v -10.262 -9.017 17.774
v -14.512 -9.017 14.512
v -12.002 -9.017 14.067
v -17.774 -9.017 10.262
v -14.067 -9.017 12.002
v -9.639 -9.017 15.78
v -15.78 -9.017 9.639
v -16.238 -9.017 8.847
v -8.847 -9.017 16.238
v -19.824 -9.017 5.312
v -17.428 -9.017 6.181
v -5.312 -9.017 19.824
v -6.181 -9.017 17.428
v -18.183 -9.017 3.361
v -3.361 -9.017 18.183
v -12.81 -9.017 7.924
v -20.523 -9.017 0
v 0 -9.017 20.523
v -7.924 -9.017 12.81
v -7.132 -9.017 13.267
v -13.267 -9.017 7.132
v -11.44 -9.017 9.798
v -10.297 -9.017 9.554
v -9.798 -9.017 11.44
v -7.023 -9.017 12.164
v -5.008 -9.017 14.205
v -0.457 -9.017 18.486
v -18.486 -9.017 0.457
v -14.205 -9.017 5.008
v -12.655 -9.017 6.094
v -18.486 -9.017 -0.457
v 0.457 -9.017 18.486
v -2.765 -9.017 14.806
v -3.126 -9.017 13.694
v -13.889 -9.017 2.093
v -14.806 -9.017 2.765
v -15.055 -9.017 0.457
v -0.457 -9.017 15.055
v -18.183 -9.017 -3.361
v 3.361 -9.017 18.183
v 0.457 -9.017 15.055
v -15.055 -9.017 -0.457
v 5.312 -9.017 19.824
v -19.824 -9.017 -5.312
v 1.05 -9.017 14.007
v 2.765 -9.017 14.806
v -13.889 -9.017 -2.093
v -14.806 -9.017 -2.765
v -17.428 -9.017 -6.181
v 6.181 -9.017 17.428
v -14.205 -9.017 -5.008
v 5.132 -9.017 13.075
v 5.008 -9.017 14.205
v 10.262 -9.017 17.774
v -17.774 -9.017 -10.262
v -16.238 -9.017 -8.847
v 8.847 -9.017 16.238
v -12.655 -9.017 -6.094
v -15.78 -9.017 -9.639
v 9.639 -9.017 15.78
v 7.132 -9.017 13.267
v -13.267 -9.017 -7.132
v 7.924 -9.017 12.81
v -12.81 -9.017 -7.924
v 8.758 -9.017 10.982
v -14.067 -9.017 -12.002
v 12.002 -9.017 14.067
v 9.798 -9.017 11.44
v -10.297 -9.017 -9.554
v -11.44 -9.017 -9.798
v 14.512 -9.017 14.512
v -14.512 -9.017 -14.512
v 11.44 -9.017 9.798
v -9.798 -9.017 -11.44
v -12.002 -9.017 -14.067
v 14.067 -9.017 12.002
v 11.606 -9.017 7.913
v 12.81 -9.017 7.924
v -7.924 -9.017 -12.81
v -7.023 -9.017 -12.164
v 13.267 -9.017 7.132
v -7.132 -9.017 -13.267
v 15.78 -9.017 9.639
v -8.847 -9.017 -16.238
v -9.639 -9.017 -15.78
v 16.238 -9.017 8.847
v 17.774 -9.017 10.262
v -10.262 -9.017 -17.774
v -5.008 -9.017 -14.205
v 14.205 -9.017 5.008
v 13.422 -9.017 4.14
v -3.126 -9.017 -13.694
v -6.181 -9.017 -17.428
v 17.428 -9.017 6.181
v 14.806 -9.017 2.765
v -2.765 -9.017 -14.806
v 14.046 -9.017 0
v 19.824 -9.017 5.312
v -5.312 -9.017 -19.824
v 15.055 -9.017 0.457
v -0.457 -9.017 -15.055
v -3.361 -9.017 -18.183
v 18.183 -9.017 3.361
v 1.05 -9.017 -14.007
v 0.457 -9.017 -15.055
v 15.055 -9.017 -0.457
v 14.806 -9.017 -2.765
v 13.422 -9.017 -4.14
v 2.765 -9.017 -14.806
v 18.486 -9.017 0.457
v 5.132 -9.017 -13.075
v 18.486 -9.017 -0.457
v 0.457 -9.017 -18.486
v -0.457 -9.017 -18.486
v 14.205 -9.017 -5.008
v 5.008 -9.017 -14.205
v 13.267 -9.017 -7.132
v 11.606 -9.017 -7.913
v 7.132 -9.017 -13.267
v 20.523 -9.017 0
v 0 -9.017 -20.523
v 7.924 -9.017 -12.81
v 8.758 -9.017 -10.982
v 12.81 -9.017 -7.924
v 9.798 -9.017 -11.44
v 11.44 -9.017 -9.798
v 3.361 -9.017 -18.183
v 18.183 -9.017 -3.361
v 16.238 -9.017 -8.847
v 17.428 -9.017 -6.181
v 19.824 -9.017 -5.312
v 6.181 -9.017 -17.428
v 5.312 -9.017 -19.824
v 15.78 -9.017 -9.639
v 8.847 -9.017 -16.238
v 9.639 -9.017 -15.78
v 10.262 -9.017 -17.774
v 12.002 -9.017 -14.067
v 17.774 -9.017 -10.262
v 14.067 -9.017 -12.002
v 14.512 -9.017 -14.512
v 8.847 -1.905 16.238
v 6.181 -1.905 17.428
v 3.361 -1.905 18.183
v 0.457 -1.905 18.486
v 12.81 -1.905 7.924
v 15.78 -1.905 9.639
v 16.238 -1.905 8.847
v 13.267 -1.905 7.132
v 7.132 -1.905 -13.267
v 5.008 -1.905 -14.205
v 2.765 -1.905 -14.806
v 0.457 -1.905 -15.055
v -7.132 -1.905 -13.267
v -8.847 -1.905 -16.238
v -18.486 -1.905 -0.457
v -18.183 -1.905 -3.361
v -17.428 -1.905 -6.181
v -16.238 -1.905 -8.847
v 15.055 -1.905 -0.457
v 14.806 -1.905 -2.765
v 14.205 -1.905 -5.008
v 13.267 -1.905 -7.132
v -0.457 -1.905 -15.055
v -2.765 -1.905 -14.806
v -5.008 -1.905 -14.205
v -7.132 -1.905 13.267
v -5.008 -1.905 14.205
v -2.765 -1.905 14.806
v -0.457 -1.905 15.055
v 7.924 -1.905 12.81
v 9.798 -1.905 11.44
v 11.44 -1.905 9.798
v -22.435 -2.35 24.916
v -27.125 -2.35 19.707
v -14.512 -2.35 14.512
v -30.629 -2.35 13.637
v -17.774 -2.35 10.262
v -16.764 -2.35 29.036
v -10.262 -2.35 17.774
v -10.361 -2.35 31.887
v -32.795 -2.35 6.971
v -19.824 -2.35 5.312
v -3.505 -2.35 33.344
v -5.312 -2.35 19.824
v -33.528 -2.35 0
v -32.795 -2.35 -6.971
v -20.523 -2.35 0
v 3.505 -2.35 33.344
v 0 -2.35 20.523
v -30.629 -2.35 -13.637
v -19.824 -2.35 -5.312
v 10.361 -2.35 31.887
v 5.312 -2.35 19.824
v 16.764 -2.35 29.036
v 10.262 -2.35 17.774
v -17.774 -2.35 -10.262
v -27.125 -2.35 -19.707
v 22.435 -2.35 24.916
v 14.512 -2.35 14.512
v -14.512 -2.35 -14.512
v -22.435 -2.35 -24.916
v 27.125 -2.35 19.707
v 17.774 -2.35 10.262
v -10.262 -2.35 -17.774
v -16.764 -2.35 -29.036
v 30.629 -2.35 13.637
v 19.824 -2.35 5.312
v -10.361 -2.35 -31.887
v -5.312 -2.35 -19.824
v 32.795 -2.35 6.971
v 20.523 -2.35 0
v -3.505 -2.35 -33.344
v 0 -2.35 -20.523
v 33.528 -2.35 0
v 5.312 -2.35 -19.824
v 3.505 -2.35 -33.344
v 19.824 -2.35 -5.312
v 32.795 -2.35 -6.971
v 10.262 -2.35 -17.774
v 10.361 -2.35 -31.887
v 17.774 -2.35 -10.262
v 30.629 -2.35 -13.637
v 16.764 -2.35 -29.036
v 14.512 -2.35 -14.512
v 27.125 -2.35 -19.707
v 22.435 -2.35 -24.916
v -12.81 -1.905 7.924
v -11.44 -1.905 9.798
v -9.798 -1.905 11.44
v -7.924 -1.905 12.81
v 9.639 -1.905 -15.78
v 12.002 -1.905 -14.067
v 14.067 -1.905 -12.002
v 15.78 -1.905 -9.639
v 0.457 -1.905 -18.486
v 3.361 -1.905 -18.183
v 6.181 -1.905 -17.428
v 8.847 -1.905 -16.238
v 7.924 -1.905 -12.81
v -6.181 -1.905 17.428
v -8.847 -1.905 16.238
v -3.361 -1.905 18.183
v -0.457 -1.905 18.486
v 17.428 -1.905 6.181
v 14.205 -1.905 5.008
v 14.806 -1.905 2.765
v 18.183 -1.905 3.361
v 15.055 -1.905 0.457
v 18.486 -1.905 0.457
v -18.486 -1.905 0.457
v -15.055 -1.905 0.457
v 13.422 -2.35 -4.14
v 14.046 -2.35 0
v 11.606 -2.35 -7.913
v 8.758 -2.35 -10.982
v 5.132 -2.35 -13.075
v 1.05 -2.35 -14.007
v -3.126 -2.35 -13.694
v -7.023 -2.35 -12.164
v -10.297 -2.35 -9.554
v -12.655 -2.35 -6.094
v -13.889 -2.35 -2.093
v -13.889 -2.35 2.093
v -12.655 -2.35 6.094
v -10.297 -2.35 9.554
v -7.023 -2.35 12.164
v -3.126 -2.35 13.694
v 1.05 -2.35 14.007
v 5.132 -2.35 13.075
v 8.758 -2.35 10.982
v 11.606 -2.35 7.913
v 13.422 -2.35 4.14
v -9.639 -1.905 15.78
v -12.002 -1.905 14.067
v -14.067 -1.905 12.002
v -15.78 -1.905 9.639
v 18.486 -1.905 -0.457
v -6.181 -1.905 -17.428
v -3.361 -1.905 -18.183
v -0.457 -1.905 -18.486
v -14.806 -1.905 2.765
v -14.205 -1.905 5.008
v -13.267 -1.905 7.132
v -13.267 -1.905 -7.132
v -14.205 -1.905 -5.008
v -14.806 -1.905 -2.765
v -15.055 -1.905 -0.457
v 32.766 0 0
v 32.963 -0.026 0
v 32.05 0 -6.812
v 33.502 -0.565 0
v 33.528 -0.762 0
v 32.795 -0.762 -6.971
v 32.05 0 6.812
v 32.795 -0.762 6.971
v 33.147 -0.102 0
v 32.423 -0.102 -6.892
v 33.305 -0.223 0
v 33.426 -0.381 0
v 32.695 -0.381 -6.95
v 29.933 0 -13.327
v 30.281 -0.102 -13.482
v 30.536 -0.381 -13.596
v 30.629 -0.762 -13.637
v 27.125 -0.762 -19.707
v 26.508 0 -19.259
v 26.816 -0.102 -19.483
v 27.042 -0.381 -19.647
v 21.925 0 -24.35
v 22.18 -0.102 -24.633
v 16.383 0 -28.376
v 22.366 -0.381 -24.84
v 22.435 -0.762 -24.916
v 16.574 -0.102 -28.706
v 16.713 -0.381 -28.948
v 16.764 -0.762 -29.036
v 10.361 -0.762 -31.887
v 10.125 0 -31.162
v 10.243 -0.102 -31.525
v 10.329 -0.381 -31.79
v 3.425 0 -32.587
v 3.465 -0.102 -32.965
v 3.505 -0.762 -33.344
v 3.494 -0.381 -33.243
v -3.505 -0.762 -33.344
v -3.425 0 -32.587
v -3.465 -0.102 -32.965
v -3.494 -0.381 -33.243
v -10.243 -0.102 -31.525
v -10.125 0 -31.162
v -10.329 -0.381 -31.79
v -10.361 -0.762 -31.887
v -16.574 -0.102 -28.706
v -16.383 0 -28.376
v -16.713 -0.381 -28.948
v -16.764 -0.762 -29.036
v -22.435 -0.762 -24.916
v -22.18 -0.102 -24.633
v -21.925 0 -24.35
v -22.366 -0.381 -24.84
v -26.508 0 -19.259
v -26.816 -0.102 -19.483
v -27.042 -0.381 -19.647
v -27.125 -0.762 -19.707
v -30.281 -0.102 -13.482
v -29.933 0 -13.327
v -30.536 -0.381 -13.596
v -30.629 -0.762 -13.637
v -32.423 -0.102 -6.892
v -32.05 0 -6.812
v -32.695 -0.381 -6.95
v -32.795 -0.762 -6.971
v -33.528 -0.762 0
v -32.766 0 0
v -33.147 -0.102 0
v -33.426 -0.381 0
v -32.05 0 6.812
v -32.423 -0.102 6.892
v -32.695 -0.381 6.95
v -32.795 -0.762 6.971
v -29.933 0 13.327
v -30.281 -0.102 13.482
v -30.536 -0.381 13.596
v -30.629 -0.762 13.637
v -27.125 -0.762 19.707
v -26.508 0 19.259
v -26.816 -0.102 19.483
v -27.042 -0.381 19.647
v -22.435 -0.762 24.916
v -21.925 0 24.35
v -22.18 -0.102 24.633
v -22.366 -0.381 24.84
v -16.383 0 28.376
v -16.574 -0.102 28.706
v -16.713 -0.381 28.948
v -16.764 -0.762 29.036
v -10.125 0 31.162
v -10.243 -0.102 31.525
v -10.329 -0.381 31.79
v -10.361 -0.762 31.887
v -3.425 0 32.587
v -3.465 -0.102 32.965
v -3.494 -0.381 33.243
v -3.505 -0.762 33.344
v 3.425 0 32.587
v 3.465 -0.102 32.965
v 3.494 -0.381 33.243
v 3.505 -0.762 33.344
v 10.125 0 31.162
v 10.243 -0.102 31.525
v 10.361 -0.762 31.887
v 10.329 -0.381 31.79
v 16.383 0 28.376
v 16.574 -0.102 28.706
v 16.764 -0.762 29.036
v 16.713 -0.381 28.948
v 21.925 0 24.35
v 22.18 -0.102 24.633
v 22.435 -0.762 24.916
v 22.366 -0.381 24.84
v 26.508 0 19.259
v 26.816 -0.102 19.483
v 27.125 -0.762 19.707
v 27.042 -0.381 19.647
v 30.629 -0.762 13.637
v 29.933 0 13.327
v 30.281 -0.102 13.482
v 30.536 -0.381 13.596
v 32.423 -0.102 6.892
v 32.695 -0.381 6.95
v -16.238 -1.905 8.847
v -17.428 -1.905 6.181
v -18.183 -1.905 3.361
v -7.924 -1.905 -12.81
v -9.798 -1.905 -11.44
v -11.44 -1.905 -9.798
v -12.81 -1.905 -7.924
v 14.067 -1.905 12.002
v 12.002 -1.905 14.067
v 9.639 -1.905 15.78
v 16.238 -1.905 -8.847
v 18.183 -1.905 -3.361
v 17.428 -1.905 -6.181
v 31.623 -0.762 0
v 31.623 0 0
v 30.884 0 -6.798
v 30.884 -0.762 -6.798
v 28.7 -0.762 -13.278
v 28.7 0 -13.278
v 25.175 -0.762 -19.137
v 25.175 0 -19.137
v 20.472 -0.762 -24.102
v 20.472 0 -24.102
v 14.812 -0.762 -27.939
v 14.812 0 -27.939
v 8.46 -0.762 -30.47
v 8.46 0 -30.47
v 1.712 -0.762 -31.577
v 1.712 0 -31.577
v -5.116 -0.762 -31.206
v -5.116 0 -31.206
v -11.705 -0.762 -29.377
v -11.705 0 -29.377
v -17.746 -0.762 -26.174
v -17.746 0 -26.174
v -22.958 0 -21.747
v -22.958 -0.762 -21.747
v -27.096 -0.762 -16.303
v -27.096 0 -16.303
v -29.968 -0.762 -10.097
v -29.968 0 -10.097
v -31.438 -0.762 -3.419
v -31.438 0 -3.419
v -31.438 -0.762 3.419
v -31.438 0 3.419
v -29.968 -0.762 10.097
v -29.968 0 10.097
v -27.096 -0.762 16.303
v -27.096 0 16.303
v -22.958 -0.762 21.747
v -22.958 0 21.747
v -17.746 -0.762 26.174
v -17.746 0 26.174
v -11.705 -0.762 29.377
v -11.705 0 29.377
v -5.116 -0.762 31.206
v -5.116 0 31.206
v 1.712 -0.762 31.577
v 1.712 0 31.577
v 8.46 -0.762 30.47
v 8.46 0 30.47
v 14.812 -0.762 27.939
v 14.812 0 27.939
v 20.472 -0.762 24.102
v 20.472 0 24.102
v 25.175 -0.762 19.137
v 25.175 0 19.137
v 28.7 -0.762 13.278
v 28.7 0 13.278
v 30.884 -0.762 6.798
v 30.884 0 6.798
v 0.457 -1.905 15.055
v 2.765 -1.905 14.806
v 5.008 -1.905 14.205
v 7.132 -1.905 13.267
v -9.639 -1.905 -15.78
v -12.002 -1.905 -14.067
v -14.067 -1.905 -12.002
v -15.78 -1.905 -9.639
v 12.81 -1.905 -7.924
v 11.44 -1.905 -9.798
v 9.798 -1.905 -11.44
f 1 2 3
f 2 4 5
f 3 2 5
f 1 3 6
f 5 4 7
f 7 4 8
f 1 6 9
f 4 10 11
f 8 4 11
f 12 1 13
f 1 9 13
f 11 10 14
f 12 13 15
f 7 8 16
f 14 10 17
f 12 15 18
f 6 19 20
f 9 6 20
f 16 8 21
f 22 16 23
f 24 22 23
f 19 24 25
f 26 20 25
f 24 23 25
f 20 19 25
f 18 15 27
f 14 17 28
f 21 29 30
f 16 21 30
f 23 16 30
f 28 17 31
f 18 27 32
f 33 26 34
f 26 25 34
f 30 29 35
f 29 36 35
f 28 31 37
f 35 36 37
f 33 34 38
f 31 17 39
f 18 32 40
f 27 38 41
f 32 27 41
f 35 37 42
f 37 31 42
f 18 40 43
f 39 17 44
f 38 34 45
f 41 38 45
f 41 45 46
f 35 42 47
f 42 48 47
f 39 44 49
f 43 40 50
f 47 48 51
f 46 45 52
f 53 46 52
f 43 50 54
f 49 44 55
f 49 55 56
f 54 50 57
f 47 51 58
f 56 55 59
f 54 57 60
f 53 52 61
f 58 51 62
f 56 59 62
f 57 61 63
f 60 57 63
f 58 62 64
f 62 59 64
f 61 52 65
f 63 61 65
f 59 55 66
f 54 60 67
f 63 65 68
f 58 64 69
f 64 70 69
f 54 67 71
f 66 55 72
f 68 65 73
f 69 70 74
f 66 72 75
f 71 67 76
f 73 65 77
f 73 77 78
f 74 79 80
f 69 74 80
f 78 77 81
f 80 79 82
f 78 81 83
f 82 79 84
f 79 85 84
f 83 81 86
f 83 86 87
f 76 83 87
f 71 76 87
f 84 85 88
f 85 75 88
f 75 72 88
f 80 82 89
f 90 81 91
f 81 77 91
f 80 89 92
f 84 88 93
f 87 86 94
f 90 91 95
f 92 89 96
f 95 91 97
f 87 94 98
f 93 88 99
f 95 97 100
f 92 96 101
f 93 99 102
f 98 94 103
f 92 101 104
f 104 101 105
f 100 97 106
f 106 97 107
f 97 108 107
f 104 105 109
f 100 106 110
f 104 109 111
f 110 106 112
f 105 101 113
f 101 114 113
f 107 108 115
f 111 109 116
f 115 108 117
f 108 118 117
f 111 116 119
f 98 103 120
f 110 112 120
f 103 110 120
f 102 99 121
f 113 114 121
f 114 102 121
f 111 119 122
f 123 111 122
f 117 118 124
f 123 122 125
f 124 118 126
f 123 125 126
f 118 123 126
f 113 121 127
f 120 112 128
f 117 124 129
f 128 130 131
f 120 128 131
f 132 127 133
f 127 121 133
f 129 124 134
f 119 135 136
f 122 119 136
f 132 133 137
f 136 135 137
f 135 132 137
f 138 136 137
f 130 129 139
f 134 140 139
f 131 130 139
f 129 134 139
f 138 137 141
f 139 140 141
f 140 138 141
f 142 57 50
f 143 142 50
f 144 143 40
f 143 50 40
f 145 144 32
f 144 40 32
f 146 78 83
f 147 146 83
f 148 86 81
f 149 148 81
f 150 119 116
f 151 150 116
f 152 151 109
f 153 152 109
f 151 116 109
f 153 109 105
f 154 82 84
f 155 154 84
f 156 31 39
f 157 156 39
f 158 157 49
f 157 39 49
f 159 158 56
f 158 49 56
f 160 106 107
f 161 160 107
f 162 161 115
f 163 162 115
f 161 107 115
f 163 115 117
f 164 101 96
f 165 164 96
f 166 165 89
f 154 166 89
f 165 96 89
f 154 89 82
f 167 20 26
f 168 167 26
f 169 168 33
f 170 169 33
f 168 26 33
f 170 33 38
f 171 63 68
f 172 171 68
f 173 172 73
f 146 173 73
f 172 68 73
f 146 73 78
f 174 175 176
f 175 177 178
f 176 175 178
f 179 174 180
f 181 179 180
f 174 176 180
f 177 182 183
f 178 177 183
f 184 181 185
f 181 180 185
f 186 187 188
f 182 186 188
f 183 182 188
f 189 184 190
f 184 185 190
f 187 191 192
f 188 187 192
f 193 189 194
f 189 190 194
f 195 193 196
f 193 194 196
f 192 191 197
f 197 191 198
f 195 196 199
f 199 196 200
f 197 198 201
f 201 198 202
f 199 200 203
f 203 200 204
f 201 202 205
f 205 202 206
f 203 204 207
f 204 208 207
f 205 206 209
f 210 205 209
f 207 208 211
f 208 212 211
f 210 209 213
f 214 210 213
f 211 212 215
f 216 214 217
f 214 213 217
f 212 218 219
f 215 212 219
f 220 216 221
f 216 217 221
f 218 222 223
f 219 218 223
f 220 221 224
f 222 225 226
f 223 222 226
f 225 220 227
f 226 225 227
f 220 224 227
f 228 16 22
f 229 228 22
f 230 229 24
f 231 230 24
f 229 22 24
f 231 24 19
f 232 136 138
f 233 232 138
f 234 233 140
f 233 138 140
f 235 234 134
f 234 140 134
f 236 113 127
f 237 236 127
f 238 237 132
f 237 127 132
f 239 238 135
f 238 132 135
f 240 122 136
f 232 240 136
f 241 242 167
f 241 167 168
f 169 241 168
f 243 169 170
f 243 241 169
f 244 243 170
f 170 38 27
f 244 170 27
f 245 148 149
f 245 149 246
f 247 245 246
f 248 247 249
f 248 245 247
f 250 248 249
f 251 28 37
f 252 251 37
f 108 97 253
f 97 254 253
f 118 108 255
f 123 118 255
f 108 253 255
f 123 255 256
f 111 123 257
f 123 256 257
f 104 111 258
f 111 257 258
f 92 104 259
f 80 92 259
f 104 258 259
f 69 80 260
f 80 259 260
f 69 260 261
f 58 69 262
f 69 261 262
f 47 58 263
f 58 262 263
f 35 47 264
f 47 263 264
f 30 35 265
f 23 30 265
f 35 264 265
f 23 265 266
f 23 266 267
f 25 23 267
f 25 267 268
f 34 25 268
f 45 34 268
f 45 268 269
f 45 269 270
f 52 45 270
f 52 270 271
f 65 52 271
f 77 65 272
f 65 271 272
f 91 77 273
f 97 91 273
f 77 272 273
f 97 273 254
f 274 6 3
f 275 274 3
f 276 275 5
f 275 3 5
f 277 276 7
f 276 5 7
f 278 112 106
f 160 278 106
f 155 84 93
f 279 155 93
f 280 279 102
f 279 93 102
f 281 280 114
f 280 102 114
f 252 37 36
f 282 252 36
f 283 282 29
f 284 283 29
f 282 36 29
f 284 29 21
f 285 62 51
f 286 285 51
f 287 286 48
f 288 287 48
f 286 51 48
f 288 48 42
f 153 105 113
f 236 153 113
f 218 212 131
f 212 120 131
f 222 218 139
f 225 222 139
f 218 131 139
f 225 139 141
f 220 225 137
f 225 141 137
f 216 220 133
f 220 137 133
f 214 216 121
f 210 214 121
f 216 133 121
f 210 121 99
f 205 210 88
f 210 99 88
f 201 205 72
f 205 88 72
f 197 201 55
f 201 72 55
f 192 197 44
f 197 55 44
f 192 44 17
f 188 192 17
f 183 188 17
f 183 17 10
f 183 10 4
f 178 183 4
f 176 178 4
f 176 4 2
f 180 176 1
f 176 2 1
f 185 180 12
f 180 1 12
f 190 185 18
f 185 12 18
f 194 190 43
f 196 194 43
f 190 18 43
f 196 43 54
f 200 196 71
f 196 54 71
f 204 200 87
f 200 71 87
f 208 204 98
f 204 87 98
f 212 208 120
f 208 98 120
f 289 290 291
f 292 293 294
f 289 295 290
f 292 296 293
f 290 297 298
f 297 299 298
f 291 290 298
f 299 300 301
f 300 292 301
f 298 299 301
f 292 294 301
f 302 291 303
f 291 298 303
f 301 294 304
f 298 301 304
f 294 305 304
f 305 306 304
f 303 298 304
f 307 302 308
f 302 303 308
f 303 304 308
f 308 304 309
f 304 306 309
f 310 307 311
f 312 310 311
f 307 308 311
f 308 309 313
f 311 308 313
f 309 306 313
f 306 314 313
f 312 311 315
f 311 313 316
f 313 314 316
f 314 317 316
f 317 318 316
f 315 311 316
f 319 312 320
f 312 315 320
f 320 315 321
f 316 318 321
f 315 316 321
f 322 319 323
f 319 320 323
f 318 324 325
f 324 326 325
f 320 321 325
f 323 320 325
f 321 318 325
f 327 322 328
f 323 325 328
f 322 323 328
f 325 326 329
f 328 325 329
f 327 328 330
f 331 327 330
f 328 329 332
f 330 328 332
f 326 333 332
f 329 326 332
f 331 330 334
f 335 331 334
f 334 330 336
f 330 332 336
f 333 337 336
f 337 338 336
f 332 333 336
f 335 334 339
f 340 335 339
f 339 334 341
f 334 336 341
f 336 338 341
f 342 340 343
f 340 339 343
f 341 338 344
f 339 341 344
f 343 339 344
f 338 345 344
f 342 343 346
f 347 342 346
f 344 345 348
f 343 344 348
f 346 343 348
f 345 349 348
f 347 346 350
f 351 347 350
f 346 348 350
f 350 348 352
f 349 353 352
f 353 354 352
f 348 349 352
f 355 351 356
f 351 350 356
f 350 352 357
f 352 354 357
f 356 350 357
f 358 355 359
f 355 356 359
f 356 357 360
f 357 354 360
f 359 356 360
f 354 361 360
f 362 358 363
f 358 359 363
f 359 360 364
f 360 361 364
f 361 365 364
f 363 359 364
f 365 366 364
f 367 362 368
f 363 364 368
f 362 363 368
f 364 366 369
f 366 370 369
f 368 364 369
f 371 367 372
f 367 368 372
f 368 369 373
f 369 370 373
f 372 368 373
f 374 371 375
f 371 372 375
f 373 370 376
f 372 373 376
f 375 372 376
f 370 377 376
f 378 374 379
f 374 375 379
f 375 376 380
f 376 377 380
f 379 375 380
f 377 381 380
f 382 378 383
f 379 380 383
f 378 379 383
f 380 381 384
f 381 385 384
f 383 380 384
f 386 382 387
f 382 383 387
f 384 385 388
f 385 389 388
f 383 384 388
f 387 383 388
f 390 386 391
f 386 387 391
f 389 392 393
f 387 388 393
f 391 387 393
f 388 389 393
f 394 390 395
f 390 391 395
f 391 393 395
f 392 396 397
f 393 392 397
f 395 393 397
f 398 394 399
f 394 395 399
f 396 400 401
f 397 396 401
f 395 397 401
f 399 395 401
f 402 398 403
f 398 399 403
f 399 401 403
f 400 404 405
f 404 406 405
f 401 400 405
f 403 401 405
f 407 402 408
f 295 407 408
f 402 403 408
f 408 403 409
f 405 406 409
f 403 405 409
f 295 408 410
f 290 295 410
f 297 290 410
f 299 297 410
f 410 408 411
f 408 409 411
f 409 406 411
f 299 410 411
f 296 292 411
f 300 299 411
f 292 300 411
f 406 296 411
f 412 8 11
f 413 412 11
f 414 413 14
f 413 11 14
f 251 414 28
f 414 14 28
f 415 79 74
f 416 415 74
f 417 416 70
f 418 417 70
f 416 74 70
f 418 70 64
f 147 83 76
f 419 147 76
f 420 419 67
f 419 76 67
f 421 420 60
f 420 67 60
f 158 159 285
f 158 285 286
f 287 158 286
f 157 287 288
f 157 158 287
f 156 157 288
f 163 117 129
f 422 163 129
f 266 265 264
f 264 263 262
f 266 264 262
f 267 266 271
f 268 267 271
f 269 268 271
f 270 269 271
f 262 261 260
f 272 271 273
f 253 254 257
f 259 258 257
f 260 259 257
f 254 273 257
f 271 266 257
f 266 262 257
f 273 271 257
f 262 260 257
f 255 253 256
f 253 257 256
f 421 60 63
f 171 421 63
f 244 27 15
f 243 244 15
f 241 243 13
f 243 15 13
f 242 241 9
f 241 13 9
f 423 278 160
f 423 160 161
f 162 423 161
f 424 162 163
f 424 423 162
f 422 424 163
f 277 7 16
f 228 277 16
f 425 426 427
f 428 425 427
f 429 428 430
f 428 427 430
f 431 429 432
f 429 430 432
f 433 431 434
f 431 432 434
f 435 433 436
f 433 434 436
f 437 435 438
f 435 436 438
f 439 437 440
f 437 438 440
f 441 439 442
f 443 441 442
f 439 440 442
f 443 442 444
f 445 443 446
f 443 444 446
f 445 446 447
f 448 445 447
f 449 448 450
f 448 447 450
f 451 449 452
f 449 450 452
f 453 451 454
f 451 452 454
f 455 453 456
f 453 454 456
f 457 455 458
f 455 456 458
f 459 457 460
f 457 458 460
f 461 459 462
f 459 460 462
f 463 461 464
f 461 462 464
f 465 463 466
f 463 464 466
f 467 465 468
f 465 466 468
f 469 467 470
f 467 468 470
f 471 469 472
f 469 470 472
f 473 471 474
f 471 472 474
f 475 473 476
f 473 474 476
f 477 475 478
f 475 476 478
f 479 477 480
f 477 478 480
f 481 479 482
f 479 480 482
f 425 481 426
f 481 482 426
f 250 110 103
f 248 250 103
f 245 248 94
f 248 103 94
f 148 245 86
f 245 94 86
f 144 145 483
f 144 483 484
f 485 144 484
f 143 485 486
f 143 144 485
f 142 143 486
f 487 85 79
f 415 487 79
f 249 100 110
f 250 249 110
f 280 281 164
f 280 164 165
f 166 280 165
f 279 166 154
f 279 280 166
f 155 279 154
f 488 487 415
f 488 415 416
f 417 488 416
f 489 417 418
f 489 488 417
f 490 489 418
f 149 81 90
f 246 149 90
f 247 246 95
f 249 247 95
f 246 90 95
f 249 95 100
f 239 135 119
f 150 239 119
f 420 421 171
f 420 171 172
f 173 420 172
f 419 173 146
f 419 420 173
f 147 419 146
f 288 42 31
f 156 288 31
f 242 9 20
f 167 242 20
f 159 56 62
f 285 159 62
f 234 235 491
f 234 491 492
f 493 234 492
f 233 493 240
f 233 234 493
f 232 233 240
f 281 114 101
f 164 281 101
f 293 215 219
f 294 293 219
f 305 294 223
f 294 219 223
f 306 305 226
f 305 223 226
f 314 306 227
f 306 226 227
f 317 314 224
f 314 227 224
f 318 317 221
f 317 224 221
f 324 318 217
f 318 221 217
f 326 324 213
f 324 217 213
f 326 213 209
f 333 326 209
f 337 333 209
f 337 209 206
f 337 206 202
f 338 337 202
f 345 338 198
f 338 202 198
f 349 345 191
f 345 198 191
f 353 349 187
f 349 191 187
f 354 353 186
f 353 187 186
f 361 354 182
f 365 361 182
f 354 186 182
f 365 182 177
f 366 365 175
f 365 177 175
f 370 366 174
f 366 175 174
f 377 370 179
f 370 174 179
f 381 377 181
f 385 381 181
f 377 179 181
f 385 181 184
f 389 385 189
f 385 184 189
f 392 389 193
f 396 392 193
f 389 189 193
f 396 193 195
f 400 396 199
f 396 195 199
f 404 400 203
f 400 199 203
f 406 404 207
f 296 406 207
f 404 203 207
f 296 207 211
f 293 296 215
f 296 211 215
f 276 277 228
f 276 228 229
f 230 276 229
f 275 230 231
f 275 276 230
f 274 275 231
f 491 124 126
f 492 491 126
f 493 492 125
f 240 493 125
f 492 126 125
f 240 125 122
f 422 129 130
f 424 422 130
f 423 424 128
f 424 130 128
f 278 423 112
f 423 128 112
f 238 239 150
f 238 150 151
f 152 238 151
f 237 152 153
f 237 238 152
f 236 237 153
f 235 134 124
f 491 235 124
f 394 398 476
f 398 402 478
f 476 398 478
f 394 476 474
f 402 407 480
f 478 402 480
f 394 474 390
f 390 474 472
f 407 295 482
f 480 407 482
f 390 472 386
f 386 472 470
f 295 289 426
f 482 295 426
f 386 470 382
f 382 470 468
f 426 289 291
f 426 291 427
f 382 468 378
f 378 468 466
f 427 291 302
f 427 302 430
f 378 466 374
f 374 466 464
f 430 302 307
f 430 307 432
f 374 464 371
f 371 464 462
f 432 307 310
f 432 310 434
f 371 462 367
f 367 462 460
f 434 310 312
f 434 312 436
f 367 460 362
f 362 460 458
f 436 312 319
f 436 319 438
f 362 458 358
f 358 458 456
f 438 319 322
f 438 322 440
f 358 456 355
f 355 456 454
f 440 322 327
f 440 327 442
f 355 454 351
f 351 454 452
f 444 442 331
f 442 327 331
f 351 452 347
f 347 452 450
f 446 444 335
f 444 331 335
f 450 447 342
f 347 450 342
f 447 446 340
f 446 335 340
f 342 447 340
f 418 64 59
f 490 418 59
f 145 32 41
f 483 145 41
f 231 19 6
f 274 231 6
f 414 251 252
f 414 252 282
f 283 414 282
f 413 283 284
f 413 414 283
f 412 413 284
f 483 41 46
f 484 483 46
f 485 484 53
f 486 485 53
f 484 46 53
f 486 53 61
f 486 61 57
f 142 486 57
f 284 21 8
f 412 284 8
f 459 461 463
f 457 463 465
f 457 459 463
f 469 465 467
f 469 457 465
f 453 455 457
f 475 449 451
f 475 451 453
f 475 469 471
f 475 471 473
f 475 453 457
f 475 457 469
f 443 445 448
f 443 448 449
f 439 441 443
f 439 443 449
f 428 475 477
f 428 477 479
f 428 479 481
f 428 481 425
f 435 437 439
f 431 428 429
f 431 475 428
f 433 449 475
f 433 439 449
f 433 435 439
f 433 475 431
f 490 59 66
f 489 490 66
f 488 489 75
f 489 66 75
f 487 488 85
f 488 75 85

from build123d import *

# Parameters (mm, degrees)
FILLET1_R          = 0.762
SKETCH2_R          = 31.623
CUT_EXTRUDE1_DEPTH = 0.762
CUT_EXTRUDE2_DEPTH = 7.112
CIRPATTERN1_COUNT  = 12


with BuildPart() as part:
    # Sketch1 → Revolve1 (revolve)
    with BuildSketch(Plane.XY):
        Polygon((0, 0), (33.528, 0), (33.528, -2.3495), (20.5232, -2.3495), (20.5232, -9.017), (14.0462, -9.017), (14.0462, -2.3495), (0, -2.3495), align=None)
    revolve(axis=Axis((0, 0, 0), (0, 1, 0)))

    # Fillet1
    fillet1_edges = [part.edges().sort_by_distance(p)[0] for p in [
        (-33.528, 0, 0),
    ]]
    fillet(fillet1_edges, radius=FILLET1_R)

    # Sketch2 → Cut-Extrude1 (cut)
    with BuildSketch(Plane(origin=(0, 0, 0), x_dir=(1, 0, 0), z_dir=(0, 1, 0))):
        Circle(SKETCH2_R)
    extrude(amount=-CUT_EXTRUDE1_DEPTH, mode=Mode.SUBTRACT)

    # Sketch3 → Cut-Extrude2 (cut)
    with BuildSketch(Plane.XZ.offset(9.017)):
        with BuildLine():
            Line((-8.846826654, 16.237553251), (-7.131682909, 13.266837141))
            ThreePointArc((-7.131682909, 13.266837141), (-3.898384221, 14.548967981), (-0.4572, 15.055259446))
            Line((-0.4572, 15.055259446), (-0.4572, 18.485546938))
            ThreePointArc((-0.4572, 18.485546938), (-4.785874727, 17.861127639), (-8.846826654, 16.237553251))
        make_face()
    cut_extrude2 = extrude(amount=-CUT_EXTRUDE2_DEPTH, mode=Mode.SUBTRACT)

    # CirPattern1: Cut-Extrude2 ×12 about axis
    cirpattern1_axis = Axis((0, -2.3495, 0), (0, -1, 0))
    for i in range(1, CIRPATTERN1_COUNT):
        add(cut_extrude2.rotate(cirpattern1_axis, i * 360 / CIRPATTERN1_COUNT), mode=Mode.SUBTRACT)


solid = part.part
